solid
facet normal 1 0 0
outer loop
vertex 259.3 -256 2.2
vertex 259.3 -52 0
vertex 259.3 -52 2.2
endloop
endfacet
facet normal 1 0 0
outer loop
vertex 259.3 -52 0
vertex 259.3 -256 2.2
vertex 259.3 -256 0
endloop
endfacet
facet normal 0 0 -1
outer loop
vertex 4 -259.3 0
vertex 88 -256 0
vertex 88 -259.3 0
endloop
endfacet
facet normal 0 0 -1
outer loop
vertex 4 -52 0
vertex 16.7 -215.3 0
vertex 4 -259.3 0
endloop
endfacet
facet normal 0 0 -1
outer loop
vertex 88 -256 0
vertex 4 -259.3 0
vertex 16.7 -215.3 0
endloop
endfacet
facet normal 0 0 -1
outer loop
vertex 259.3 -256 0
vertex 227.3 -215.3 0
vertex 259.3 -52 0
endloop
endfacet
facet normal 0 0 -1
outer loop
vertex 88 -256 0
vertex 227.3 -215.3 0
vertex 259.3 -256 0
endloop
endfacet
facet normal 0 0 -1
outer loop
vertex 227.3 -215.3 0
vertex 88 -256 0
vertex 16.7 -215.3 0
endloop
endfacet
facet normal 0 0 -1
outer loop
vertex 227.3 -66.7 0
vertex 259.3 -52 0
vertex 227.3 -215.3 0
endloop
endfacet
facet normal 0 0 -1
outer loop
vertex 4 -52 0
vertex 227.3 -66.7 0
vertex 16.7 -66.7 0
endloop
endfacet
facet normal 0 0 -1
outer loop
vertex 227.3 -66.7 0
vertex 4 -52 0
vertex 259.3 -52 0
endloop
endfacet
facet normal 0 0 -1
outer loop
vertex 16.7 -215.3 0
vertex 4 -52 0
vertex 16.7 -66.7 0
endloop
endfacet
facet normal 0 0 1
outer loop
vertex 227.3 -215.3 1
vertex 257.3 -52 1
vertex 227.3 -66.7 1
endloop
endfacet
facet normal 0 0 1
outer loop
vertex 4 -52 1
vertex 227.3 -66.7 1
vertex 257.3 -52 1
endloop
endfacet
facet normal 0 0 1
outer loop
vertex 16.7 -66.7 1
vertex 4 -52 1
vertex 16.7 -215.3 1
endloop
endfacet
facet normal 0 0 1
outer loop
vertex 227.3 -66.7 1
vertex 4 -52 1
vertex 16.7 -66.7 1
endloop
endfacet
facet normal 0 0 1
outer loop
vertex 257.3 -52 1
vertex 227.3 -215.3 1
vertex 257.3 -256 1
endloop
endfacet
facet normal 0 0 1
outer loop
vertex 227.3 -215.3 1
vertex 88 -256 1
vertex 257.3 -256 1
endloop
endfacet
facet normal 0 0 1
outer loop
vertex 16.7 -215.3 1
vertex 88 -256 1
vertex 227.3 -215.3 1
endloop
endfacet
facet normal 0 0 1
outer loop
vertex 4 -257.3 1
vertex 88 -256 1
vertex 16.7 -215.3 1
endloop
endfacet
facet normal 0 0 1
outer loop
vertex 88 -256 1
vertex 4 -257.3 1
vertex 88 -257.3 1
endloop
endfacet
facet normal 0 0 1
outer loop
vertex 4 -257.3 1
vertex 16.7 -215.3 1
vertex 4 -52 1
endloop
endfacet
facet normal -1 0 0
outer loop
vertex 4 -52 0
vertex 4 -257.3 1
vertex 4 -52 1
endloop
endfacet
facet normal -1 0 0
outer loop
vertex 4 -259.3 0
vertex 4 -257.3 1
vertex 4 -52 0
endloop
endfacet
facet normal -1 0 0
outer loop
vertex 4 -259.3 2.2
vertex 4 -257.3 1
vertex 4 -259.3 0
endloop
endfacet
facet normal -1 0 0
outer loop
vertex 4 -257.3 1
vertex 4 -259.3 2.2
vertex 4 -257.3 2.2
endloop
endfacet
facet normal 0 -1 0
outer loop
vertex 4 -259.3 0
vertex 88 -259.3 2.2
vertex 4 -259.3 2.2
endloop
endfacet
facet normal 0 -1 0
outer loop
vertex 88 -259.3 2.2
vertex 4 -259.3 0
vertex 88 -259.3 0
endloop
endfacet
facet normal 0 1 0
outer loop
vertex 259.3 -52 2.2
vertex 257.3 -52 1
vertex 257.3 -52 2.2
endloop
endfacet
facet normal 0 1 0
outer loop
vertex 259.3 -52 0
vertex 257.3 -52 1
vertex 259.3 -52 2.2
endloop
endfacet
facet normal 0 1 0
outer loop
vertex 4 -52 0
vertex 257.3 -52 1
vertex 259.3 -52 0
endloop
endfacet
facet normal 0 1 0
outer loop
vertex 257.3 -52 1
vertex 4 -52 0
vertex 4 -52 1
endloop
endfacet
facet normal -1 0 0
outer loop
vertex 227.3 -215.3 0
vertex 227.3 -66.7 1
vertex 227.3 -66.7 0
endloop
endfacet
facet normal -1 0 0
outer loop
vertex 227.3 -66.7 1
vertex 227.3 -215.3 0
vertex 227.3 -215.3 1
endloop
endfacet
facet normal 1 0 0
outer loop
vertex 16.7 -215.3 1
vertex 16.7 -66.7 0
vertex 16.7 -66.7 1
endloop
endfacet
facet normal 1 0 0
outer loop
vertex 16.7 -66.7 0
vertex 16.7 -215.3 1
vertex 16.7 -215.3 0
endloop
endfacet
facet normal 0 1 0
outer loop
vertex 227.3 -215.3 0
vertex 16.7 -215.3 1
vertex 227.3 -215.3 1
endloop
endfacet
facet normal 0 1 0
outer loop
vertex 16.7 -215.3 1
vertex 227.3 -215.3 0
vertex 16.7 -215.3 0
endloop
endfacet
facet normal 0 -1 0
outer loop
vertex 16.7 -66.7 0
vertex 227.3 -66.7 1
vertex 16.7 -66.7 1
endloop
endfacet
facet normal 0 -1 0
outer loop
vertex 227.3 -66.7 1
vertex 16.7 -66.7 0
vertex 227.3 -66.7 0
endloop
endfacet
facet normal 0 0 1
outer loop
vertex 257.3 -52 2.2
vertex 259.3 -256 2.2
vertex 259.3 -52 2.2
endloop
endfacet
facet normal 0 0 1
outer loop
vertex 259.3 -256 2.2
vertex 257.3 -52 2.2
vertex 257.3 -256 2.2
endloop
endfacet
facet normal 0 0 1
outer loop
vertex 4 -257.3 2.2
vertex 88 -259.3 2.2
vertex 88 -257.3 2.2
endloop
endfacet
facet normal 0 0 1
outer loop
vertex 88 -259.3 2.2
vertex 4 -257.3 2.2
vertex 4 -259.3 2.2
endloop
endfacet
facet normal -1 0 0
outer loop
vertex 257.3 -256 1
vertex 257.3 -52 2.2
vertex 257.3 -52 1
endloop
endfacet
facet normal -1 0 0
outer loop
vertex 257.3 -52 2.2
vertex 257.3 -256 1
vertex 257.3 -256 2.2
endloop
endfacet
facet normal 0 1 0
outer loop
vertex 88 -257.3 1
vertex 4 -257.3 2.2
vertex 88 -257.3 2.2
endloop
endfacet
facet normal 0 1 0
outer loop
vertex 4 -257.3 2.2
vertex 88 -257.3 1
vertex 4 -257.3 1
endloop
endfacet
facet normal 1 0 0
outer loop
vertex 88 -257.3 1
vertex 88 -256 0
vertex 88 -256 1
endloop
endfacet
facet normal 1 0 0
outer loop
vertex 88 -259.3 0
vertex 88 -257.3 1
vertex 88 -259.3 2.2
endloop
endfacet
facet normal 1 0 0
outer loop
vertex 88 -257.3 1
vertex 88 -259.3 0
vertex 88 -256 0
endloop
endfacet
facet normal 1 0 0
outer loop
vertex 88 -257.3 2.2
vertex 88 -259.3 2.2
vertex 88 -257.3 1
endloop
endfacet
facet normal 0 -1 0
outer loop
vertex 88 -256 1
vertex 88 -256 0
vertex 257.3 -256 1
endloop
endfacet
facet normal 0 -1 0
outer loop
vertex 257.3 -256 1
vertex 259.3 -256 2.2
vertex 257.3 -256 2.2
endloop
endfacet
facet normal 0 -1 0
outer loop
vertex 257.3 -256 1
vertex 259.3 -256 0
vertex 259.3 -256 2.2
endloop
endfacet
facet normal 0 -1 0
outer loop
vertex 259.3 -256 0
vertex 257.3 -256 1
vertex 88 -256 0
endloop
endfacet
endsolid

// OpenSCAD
// Paper jig for P2S plotting — a window frame that surrounds the sheet
// on all four sides and registers against the plate's back and right
// edges. The window places the sheet at the alignment margins (29 mm
// from the right, 41 mm from the back, see README "Paper position is
// critical").
//
// Use: OFF the machine, drop the sheet into the window (a shallow
// pocket — the sheet lies flush on the table/plate inside it) and tape
// its corners to the frame top. Carry the frame to the printer and
// hook the lips over the plate's back/right edges. The jig stays on
// during plotting (1 mm base, the pen has a 3 mm Z hop and a 5 mm
// drawing margin).
//
// The STL is exported in PRINT ORIENTATION (lips up) — print as-is,
// no supports. Flip it over for use.
//
// Coordinates here: bed coordinates, (0,0) = the build area's front-left
// corner, X toward the right, Y toward the back wall. Z=0 = plate surface.

/* ---------- MEASURE THESE ON THE MACHINE BEFORE THE FIRST PRINT ---------- */
edge_to_bed = 1.0;  // plate edge beyond the build area, per side (ESTIMATE)
lip_drop    = 1.2;  // how far the lip hangs down along the plate edge —
                    // too long and it hits the heatbed and lifts the jig
lip_clear   = 0.3;  // clearance lip <-> plate edge
// The back lip stops here: the plate's rear handle tab starts at x~92
// (from Bambu Studio's bbl-3dp-X1.stl), and to its right the machine
// has a further obstruction not present in any STL — so everything
// from the tab to the right edge is cut away (lip + base overhang).
// Registration still works: back lip left of here locks Y + rotation,
// the right lip locks X.
back_lip_end = 88;
/* ---------- PAPER FORMAT (one frame per format) --------------------------- */
paper_w   = 210;  // A5 landscape 210x148; cut A4 = 210x200
paper_h   = 148;
win_clear = 0.3;  // window <-> sheet clearance, per side
/* -------------------------------------------------------------------------- */

bed = 256;
paper_right_margin = 29;            // sheet's right edge from the build area's right edge
paper_back_margin  = 41;            // sheet's back edge from the build area's back edge
paper_x = bed - paper_right_margin; // 227 — sheet right edge
paper_y = bed - paper_back_margin;  // 215 — sheet back edge
sheet_left  = paper_x - paper_w;    // 17
sheet_front = paper_y - paper_h;    // 67 (A5)

t     = 1.0;  // base thickness — keep <= 1.2 (pen travel clearance is 3 mm)
lip_t = 2.0;  // lip thickness

border_left  = 13;  // frame border = tape landing area
border_front = 15;

plate_x = bed + edge_to_bed;         // the plate's physical right edge
plate_y = bed + edge_to_bed;         // the plate's physical back edge
outer_x = plate_x + lip_clear + lip_t;
outer_y = plate_y + lip_clear + lip_t;
frame_left  = sheet_left - border_left;
frame_front = sheet_front - border_front;

// the frame itself must fit on the 256 mm bed to be printable
assert(outer_x - frame_left <= bed, "frame too wide — shrink border_left");
assert(outer_y - frame_front <= bed, "frame too deep — shrink border_front");

module base() {
    difference() {
        translate([frame_left, frame_front, 0])
            cube([outer_x - frame_left, outer_y - frame_front, t]);
        // the window (shallow pocket — sheet lies on the plate inside it)
        translate([sheet_left - win_clear, sheet_front - win_clear, -1])
            cube([paper_w + 2 * win_clear, paper_h + 2 * win_clear, t + 2]);
    }
}

module lips() {
    translate([plate_x + lip_clear, frame_front, -lip_drop])
        cube([lip_t, outer_y - frame_front, lip_drop + t]);
    translate([frame_left, plate_y + lip_clear, -lip_drop])
        cube([outer_x - frame_left, lip_t, lip_drop + t]);
}

module cutouts() {
    // cut lip AND base overhang at the back edge, from back_lip_end all
    // the way to the right (also trims the right lip's back tip — fine)
    translate([back_lip_end, plate_y - 1, -lip_drop - 1])
        cube([outer_x - back_lip_end + 1, outer_y - plate_y + 2, lip_drop + t + 2]);
}

module jig() {
    difference() {
        union() { base(); lips(); }
        cutouts();
    }
}

// Export in print orientation: rotated 180° about X (a true flip, not a
// mirror), raised so the lowest point sits at z=0.
rotate([180, 0, 0]) translate([0, 0, -t]) jig();
